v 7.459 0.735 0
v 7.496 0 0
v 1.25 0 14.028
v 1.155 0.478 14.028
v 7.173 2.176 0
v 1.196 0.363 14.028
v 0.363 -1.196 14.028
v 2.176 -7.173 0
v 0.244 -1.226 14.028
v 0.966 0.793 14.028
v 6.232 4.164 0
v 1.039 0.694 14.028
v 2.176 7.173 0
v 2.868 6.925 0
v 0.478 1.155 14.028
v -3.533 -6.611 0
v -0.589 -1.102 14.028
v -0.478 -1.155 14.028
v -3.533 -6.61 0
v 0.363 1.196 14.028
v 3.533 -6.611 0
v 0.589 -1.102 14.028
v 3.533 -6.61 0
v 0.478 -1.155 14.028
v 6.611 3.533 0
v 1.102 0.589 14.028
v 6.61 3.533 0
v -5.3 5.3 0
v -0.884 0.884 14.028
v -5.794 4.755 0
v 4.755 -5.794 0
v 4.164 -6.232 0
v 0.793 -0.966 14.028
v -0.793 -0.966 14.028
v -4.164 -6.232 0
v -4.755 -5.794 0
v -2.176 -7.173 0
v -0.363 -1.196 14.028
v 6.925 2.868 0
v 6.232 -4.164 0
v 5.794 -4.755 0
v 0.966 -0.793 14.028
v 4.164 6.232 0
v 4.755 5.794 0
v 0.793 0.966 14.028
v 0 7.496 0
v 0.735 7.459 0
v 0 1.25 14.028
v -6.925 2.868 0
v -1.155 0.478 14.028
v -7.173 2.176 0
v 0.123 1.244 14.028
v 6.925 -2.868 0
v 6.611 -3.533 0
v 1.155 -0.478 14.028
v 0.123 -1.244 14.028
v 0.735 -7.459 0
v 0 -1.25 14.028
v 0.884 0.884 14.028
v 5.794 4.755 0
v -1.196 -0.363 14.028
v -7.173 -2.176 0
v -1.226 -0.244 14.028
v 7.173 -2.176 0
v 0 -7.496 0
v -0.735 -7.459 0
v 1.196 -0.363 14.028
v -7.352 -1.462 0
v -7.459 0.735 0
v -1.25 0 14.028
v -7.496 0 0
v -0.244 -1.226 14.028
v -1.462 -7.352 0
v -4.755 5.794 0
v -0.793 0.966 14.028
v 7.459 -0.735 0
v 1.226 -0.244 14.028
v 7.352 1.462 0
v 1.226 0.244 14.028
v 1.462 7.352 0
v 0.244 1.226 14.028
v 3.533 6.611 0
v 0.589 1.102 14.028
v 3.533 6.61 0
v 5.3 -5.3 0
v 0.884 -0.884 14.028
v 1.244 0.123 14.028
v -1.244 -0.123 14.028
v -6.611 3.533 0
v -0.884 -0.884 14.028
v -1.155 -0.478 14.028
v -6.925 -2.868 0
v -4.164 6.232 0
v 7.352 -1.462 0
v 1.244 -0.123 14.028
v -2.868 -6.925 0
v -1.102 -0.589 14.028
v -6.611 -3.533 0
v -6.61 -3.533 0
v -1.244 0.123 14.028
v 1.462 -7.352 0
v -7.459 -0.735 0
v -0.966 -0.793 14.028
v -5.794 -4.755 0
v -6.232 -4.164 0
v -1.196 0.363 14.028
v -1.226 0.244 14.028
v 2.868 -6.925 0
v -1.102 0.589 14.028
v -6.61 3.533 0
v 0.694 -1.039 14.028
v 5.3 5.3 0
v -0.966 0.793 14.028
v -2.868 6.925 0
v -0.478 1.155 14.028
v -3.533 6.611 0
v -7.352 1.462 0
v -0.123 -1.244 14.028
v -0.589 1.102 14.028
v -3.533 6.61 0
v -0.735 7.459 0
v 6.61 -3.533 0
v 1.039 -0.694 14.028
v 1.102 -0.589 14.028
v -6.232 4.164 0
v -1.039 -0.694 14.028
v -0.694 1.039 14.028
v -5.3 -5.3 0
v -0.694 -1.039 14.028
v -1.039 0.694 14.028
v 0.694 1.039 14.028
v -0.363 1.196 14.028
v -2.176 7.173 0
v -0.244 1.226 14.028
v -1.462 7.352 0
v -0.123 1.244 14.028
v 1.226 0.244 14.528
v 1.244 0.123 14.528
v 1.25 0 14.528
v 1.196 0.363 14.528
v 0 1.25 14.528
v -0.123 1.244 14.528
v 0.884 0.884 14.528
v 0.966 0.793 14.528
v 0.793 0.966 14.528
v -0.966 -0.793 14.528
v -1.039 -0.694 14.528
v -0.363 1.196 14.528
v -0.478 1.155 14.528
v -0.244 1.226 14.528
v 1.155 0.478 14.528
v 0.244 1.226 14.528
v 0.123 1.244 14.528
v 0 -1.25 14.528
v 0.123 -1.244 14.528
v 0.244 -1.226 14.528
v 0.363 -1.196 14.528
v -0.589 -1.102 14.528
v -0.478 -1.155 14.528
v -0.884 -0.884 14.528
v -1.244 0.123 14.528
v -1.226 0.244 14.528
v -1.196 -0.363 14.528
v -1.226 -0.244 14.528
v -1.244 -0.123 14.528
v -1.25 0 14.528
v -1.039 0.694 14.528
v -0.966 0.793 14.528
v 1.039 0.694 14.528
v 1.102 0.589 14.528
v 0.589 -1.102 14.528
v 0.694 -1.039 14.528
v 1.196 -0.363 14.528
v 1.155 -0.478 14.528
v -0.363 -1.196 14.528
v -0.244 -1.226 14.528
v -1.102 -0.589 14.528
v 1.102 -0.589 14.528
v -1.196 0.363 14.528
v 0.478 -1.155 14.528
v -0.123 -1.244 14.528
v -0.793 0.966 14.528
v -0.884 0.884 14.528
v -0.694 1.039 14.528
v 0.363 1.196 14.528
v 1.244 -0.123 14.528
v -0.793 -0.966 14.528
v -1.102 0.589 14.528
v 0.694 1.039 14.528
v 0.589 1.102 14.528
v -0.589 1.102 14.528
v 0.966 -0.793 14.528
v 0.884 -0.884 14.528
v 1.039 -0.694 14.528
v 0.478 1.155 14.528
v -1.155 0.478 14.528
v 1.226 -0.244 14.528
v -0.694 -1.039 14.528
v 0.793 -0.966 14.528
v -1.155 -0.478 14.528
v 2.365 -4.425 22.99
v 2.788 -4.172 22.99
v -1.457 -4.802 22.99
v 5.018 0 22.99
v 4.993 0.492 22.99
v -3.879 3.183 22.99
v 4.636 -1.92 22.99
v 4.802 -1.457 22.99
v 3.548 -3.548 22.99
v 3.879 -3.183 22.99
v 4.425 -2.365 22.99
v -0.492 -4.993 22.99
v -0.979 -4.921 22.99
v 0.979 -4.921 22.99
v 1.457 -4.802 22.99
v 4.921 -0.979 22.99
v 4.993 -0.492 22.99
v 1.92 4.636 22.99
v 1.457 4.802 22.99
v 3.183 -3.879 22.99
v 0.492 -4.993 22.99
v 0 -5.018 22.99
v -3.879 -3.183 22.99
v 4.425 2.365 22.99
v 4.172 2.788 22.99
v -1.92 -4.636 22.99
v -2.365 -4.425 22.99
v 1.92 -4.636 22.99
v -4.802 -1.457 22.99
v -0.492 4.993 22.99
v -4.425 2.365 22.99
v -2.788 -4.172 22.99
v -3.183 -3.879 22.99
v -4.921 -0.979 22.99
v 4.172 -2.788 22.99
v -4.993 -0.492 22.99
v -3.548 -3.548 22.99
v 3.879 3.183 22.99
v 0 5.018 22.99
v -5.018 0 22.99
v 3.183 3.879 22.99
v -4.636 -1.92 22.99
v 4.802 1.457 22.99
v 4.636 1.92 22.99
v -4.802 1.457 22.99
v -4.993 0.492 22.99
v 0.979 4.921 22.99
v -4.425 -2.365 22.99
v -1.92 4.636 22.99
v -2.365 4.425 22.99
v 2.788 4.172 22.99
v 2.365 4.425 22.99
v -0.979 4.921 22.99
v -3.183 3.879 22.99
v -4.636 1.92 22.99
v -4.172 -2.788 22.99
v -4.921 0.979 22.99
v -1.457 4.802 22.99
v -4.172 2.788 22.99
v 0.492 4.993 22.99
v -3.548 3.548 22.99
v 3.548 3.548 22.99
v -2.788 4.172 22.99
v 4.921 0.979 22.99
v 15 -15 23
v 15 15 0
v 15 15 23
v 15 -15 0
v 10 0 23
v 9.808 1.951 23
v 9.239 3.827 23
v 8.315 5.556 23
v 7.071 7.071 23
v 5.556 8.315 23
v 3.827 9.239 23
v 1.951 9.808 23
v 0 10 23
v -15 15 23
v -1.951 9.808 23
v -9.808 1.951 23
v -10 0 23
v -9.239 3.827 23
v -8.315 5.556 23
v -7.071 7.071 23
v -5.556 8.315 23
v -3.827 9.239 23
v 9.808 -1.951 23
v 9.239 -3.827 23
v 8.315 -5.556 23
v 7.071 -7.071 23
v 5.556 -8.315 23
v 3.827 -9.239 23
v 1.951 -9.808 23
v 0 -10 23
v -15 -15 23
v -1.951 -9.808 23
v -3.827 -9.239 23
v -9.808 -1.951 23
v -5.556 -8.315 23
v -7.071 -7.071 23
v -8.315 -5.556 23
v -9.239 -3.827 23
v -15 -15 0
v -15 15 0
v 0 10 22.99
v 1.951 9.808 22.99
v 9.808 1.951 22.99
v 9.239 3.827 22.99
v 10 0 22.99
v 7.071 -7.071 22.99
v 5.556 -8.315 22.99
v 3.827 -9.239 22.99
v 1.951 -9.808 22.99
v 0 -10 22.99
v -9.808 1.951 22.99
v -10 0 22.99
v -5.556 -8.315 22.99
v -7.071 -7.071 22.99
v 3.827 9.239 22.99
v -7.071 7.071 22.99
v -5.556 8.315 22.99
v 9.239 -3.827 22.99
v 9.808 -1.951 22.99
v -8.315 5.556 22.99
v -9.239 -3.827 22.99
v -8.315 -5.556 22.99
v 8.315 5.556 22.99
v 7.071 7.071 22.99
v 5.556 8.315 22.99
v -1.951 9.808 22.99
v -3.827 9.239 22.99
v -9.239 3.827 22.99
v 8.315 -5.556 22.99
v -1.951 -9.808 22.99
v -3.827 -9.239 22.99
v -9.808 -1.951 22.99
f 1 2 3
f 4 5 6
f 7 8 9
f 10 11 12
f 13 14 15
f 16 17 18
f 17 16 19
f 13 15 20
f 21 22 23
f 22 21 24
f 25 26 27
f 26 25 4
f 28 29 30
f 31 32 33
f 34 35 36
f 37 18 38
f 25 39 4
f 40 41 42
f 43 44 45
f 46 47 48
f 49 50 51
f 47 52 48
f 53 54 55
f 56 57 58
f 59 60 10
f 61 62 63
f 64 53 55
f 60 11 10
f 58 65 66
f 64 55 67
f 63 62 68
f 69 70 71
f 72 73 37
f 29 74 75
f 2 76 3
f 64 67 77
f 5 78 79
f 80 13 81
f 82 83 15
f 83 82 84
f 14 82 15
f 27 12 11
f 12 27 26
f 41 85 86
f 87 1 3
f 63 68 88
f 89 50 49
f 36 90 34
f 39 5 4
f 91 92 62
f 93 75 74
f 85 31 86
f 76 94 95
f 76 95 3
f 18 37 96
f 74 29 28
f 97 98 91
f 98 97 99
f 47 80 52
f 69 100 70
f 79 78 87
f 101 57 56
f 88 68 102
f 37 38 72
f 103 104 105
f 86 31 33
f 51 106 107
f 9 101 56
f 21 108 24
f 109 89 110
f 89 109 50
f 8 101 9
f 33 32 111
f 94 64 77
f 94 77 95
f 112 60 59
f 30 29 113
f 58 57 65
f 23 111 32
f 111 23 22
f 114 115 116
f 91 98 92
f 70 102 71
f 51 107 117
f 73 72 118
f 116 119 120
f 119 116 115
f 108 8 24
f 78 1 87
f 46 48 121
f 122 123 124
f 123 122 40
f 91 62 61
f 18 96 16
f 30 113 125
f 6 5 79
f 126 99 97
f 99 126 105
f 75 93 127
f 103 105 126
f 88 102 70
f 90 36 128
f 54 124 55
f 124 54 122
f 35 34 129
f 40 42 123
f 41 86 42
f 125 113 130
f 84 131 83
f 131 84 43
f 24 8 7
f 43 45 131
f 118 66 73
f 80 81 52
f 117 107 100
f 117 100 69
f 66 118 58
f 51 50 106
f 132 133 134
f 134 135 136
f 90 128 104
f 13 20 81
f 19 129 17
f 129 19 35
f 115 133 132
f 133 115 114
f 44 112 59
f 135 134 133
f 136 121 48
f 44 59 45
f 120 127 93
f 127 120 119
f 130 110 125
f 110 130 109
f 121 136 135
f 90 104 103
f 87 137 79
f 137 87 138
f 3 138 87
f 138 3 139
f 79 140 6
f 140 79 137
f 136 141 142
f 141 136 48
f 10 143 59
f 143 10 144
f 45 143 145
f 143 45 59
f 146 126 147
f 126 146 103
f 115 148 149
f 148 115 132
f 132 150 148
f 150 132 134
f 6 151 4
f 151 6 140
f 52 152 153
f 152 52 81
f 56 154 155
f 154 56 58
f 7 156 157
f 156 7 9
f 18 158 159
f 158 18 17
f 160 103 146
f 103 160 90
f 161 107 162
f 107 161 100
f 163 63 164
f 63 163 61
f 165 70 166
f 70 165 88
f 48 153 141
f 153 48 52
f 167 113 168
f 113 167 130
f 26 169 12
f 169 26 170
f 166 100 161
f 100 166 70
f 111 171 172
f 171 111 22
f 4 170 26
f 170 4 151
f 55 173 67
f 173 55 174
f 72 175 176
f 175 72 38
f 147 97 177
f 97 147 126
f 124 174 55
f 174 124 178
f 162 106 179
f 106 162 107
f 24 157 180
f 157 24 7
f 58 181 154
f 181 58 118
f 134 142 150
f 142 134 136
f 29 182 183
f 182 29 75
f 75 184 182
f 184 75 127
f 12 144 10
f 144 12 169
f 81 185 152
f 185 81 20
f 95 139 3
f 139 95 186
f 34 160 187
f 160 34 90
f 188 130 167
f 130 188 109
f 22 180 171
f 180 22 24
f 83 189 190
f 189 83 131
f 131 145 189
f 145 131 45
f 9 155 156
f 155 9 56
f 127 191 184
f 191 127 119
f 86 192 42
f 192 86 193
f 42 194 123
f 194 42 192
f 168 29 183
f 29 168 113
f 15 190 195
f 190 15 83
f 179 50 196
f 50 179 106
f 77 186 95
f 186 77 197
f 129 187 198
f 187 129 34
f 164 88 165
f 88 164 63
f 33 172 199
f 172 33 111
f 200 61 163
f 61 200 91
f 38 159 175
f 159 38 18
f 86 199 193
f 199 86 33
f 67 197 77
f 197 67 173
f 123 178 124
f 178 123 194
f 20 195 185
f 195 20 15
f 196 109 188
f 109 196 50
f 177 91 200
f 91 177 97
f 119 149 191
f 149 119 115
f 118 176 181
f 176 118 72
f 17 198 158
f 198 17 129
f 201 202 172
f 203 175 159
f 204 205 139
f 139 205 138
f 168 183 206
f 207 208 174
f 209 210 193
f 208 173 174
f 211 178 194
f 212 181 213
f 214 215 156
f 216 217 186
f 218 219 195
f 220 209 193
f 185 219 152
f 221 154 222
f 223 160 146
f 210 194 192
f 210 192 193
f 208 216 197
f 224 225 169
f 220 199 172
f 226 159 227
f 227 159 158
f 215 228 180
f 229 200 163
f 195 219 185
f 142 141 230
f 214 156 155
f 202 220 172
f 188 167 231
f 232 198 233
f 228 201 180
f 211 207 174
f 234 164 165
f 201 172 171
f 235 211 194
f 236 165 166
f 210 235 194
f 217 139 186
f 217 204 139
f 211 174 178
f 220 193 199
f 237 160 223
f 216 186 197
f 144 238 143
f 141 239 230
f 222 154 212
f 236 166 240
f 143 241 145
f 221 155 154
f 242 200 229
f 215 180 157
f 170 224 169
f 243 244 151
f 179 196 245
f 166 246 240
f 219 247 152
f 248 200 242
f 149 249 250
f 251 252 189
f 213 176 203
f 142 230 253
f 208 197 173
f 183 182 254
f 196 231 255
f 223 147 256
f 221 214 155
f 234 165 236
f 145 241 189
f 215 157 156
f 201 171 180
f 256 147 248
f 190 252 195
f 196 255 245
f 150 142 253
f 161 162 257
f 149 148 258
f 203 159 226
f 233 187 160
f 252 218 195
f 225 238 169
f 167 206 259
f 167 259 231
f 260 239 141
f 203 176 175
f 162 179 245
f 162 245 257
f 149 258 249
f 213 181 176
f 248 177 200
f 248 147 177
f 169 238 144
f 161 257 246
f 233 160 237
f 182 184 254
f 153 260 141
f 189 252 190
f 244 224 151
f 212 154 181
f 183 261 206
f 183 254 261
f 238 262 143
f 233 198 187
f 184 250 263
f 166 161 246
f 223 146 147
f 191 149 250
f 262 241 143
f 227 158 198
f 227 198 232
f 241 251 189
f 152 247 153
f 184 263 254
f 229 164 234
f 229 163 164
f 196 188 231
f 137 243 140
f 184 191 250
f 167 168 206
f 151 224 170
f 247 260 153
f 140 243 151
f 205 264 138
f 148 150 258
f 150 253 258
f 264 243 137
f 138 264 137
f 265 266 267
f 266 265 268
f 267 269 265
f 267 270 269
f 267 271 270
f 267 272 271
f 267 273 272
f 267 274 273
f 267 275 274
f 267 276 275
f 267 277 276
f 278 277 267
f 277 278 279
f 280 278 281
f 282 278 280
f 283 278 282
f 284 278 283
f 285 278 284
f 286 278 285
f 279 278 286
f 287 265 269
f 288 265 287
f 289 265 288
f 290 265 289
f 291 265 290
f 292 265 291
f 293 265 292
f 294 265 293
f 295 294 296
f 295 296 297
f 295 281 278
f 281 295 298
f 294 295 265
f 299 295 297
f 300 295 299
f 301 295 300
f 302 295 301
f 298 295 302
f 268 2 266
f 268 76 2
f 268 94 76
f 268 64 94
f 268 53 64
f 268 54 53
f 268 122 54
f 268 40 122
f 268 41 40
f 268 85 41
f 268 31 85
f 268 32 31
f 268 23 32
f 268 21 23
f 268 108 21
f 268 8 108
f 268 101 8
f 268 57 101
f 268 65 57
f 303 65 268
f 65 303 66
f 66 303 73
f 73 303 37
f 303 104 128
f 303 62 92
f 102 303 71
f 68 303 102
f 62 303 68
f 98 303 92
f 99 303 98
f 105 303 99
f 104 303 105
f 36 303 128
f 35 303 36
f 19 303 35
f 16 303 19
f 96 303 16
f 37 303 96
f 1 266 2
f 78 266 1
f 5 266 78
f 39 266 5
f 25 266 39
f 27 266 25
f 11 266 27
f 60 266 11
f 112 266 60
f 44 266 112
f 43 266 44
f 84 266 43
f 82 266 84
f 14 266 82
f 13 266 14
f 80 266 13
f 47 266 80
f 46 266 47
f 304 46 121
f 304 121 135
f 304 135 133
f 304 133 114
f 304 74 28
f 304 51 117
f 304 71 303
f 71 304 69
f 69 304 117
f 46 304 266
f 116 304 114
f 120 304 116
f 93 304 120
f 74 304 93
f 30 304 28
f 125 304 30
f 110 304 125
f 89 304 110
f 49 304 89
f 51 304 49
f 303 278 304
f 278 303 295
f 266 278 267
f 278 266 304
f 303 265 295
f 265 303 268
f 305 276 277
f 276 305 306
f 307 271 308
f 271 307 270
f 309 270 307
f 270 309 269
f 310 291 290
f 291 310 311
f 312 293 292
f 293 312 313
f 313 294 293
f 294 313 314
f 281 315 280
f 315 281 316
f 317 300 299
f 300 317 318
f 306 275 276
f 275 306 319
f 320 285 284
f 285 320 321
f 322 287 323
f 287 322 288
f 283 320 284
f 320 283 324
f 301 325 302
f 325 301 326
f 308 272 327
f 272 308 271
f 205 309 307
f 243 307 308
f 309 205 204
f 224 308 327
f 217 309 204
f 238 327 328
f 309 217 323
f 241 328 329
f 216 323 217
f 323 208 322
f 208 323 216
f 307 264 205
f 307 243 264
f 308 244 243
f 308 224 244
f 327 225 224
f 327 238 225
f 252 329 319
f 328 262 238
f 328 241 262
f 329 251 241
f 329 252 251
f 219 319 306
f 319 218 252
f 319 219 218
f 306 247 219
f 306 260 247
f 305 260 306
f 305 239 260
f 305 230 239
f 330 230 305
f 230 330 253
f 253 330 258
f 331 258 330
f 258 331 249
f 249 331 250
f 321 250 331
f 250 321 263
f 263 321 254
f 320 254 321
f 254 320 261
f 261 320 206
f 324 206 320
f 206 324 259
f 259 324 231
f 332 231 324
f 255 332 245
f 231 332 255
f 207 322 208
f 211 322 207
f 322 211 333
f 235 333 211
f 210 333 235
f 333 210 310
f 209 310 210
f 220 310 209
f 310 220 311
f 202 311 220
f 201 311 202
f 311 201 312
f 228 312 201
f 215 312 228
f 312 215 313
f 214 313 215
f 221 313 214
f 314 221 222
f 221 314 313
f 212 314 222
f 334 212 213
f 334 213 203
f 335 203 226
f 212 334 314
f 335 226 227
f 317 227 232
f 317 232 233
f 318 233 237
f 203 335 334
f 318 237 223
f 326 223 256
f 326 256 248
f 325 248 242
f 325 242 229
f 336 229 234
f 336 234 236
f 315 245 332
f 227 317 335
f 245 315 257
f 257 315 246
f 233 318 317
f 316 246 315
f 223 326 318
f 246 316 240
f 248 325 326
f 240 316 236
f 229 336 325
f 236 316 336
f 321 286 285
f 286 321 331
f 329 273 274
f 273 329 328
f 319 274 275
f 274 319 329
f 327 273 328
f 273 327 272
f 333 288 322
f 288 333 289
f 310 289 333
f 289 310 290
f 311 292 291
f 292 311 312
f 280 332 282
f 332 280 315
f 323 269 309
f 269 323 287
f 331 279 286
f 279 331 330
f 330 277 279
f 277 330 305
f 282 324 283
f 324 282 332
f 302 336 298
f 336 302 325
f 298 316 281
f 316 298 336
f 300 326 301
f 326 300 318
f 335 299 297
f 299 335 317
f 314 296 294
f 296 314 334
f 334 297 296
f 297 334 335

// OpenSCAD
// AeroCool Throat Test — Quick Print Funnel Verification
// Print: Flat on bed, funnel vertical, no supports, PETG, 0.2mm layer
// Estimated print time: ~25-30 min, ~8g PETG
// 
// PURPOSE: Verify the 2.5mm throat is printable with your nozzle and PETG
// before committing to the full 2.5-hour tile print. Inspect with a light.

// ============================================================
// PARAMETERS (same as main tile funnel)
// ============================================================

INLET_D = 15;             // Inlet diameter (mm)
THROAT_D = 2.5;           // Throat diameter (mm)
OUTLET_D_TARGET = 12;     // Target outlet diameter (mm)
THROAT_LEN = 0.5;         // Straight throat length (mm)
CONE_ANGLE = 24;          // Half-angle from axis (degrees)

// Same thickness as the full tile funnel
TILE_THICKNESS = 28;
CHAMBER_DEPTH = 5;
AVAIL_DEPTH = TILE_THICKNESS - CHAMBER_DEPTH;

r_in = INLET_D / 2;
r_th = THROAT_D / 2;

converge_len = (r_in - r_th) / tan(CONE_ANGLE);
diverge_len = AVAIL_DEPTH - converge_len - THROAT_LEN;
r_out = r_th + diverge_len * tan(CONE_ANGLE);
OUTLET_D = 2 * r_out;

// ============================================================
// GEOMETRY REPORT
// ============================================================

echo(str("=== Throat Test Geometry ==="));
echo(str("Throat diameter: ", THROAT_D, " mm"));
echo(str("Throat diameter in nozzle widths: ", THROAT_D / 0.4, " (0.4mm nozzle)"));
echo(str("Converging section: ", converge_len, " mm"));
echo(str("Diverging section: ", diverge_len, " mm"));
echo(str("Total funnel depth: ", converge_len + THROAT_LEN + diverge_len, " mm"));
echo(str("Outlet diameter: ", OUTLET_D, " mm"));

// ============================================================
// MODULES
// ============================================================

module venturi_funnel() {
    cylinder(h = converge_len, r1 = r_in, r2 = r_th, $fn = 64);
    translate([0, 0, converge_len])
        cylinder(h = THROAT_LEN, r = r_th, $fn = 64);
    translate([0, 0, converge_len + THROAT_LEN])
        cylinder(h = diverge_len, r1 = r_th, r2 = r_out, $fn = 64);
}

// ============================================================
// MAIN — small block with single funnel through it
// ============================================================

BLOCK_SIZE = 30;  // mm square

difference() {
    // Solid block
    translate([-BLOCK_SIZE/2, -BLOCK_SIZE/2, 0])
        cube([BLOCK_SIZE, BLOCK_SIZE, AVAIL_DEPTH]);
    
    // Single funnel through the center
    translate([0, 0, -0.01])
        venturi_funnel();
    
    // Small expansion chamber on top face
    translate([0, 0, AVAIL_DEPTH - 0.01])
        cylinder(h = 3, d = 20, $fn = 32);
}

// ============================================================
// PASS / FAIL CRITERIA
// ============================================================
// PASS: Light shines cleanly through the 2.5mm throat. Walls are smooth.
//       No blobs or stringing block more than 10% of the throat.
// 
// MARGINAL: Throat is oval or slightly rough, but light passes.
//           You may see reduced performance but the full tile is still worth trying.
// 
// FAIL: Throat is clogged, severely oval, or <50% open. 
//       Increase THROAT_D to 3.0 or 3.5 in the main tile before printing.
// ============================================================
